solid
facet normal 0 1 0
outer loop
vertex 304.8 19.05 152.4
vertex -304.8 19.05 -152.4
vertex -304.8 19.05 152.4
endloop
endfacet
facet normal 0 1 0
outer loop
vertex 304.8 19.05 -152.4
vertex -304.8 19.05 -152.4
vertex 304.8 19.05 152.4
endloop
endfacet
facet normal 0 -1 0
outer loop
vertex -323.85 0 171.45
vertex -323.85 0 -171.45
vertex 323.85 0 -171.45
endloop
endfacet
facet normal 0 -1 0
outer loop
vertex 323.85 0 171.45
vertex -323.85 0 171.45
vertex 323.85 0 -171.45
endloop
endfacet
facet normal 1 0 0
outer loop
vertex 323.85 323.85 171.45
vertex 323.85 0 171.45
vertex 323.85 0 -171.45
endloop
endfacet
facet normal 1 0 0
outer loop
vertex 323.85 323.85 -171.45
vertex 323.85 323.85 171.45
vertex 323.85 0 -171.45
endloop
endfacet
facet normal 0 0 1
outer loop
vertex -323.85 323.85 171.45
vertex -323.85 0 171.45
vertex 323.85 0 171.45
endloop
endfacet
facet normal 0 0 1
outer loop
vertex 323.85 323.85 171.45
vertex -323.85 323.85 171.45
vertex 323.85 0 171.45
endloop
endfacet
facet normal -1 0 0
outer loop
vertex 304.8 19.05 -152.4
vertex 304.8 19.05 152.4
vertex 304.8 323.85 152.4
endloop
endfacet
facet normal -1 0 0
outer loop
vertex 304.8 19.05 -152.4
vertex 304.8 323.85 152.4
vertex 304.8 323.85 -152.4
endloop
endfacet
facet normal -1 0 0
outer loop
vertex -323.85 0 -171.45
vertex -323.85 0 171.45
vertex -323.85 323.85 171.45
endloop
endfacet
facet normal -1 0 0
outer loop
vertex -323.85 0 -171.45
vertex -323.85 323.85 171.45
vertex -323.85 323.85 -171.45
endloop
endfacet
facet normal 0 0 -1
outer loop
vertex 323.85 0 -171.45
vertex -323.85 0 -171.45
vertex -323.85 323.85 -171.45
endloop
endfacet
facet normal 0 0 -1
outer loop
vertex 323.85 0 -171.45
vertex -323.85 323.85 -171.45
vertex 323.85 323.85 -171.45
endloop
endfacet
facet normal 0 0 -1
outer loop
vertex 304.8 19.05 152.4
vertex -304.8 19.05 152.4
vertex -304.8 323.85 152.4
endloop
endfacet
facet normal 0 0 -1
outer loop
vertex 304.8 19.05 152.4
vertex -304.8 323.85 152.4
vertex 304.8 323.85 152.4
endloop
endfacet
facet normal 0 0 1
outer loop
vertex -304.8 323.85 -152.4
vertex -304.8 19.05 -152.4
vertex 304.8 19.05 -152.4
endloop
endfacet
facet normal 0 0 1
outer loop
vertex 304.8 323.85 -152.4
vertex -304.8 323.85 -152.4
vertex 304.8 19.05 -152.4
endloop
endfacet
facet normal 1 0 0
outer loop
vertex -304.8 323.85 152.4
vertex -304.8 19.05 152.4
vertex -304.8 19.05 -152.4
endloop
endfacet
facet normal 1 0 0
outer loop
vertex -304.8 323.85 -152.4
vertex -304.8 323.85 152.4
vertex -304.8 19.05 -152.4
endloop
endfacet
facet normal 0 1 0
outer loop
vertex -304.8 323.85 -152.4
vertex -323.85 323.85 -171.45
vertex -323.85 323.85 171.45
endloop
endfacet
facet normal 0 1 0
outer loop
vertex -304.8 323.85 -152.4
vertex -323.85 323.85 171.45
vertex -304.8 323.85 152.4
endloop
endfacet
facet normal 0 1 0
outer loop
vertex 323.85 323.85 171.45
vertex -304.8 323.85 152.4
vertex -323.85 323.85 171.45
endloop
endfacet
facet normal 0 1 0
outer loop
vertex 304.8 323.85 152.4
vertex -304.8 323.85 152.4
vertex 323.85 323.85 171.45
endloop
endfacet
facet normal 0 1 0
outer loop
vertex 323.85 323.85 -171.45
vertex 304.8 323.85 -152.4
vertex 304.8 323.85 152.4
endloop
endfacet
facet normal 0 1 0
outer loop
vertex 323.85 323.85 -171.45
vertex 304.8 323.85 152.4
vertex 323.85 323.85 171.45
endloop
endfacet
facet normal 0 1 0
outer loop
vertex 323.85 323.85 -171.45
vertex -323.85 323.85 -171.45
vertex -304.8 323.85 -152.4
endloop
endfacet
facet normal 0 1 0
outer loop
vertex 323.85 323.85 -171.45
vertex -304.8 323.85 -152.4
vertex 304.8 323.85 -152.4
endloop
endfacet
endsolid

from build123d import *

# Parameters (mm, degrees)
SKETCH2_W           = 647.7
SKETCH2_H           = 342.9
BOSS_EXTRUDE1_DEPTH = 323.85
SHELL1_T            = -19.05


with BuildPart() as part:
    # Sketch2 → Boss-Extrude1 (new body)
    with BuildSketch(Plane(origin=(0, 0, 0), x_dir=(1, 0, 0), z_dir=(0, 1, 0))):
        Rectangle(SKETCH2_W, SKETCH2_H)
    extrude(amount=BOSS_EXTRUDE1_DEPTH)

    # Shell1
    shell1_openings = [part.faces().sort_by_distance(p)[0] for p in [
        (0, 323.85, 0),
    ]]
    offset(amount=SHELL1_T, openings=shell1_openings, kind=Kind.INTERSECTION)


solid = part.part
